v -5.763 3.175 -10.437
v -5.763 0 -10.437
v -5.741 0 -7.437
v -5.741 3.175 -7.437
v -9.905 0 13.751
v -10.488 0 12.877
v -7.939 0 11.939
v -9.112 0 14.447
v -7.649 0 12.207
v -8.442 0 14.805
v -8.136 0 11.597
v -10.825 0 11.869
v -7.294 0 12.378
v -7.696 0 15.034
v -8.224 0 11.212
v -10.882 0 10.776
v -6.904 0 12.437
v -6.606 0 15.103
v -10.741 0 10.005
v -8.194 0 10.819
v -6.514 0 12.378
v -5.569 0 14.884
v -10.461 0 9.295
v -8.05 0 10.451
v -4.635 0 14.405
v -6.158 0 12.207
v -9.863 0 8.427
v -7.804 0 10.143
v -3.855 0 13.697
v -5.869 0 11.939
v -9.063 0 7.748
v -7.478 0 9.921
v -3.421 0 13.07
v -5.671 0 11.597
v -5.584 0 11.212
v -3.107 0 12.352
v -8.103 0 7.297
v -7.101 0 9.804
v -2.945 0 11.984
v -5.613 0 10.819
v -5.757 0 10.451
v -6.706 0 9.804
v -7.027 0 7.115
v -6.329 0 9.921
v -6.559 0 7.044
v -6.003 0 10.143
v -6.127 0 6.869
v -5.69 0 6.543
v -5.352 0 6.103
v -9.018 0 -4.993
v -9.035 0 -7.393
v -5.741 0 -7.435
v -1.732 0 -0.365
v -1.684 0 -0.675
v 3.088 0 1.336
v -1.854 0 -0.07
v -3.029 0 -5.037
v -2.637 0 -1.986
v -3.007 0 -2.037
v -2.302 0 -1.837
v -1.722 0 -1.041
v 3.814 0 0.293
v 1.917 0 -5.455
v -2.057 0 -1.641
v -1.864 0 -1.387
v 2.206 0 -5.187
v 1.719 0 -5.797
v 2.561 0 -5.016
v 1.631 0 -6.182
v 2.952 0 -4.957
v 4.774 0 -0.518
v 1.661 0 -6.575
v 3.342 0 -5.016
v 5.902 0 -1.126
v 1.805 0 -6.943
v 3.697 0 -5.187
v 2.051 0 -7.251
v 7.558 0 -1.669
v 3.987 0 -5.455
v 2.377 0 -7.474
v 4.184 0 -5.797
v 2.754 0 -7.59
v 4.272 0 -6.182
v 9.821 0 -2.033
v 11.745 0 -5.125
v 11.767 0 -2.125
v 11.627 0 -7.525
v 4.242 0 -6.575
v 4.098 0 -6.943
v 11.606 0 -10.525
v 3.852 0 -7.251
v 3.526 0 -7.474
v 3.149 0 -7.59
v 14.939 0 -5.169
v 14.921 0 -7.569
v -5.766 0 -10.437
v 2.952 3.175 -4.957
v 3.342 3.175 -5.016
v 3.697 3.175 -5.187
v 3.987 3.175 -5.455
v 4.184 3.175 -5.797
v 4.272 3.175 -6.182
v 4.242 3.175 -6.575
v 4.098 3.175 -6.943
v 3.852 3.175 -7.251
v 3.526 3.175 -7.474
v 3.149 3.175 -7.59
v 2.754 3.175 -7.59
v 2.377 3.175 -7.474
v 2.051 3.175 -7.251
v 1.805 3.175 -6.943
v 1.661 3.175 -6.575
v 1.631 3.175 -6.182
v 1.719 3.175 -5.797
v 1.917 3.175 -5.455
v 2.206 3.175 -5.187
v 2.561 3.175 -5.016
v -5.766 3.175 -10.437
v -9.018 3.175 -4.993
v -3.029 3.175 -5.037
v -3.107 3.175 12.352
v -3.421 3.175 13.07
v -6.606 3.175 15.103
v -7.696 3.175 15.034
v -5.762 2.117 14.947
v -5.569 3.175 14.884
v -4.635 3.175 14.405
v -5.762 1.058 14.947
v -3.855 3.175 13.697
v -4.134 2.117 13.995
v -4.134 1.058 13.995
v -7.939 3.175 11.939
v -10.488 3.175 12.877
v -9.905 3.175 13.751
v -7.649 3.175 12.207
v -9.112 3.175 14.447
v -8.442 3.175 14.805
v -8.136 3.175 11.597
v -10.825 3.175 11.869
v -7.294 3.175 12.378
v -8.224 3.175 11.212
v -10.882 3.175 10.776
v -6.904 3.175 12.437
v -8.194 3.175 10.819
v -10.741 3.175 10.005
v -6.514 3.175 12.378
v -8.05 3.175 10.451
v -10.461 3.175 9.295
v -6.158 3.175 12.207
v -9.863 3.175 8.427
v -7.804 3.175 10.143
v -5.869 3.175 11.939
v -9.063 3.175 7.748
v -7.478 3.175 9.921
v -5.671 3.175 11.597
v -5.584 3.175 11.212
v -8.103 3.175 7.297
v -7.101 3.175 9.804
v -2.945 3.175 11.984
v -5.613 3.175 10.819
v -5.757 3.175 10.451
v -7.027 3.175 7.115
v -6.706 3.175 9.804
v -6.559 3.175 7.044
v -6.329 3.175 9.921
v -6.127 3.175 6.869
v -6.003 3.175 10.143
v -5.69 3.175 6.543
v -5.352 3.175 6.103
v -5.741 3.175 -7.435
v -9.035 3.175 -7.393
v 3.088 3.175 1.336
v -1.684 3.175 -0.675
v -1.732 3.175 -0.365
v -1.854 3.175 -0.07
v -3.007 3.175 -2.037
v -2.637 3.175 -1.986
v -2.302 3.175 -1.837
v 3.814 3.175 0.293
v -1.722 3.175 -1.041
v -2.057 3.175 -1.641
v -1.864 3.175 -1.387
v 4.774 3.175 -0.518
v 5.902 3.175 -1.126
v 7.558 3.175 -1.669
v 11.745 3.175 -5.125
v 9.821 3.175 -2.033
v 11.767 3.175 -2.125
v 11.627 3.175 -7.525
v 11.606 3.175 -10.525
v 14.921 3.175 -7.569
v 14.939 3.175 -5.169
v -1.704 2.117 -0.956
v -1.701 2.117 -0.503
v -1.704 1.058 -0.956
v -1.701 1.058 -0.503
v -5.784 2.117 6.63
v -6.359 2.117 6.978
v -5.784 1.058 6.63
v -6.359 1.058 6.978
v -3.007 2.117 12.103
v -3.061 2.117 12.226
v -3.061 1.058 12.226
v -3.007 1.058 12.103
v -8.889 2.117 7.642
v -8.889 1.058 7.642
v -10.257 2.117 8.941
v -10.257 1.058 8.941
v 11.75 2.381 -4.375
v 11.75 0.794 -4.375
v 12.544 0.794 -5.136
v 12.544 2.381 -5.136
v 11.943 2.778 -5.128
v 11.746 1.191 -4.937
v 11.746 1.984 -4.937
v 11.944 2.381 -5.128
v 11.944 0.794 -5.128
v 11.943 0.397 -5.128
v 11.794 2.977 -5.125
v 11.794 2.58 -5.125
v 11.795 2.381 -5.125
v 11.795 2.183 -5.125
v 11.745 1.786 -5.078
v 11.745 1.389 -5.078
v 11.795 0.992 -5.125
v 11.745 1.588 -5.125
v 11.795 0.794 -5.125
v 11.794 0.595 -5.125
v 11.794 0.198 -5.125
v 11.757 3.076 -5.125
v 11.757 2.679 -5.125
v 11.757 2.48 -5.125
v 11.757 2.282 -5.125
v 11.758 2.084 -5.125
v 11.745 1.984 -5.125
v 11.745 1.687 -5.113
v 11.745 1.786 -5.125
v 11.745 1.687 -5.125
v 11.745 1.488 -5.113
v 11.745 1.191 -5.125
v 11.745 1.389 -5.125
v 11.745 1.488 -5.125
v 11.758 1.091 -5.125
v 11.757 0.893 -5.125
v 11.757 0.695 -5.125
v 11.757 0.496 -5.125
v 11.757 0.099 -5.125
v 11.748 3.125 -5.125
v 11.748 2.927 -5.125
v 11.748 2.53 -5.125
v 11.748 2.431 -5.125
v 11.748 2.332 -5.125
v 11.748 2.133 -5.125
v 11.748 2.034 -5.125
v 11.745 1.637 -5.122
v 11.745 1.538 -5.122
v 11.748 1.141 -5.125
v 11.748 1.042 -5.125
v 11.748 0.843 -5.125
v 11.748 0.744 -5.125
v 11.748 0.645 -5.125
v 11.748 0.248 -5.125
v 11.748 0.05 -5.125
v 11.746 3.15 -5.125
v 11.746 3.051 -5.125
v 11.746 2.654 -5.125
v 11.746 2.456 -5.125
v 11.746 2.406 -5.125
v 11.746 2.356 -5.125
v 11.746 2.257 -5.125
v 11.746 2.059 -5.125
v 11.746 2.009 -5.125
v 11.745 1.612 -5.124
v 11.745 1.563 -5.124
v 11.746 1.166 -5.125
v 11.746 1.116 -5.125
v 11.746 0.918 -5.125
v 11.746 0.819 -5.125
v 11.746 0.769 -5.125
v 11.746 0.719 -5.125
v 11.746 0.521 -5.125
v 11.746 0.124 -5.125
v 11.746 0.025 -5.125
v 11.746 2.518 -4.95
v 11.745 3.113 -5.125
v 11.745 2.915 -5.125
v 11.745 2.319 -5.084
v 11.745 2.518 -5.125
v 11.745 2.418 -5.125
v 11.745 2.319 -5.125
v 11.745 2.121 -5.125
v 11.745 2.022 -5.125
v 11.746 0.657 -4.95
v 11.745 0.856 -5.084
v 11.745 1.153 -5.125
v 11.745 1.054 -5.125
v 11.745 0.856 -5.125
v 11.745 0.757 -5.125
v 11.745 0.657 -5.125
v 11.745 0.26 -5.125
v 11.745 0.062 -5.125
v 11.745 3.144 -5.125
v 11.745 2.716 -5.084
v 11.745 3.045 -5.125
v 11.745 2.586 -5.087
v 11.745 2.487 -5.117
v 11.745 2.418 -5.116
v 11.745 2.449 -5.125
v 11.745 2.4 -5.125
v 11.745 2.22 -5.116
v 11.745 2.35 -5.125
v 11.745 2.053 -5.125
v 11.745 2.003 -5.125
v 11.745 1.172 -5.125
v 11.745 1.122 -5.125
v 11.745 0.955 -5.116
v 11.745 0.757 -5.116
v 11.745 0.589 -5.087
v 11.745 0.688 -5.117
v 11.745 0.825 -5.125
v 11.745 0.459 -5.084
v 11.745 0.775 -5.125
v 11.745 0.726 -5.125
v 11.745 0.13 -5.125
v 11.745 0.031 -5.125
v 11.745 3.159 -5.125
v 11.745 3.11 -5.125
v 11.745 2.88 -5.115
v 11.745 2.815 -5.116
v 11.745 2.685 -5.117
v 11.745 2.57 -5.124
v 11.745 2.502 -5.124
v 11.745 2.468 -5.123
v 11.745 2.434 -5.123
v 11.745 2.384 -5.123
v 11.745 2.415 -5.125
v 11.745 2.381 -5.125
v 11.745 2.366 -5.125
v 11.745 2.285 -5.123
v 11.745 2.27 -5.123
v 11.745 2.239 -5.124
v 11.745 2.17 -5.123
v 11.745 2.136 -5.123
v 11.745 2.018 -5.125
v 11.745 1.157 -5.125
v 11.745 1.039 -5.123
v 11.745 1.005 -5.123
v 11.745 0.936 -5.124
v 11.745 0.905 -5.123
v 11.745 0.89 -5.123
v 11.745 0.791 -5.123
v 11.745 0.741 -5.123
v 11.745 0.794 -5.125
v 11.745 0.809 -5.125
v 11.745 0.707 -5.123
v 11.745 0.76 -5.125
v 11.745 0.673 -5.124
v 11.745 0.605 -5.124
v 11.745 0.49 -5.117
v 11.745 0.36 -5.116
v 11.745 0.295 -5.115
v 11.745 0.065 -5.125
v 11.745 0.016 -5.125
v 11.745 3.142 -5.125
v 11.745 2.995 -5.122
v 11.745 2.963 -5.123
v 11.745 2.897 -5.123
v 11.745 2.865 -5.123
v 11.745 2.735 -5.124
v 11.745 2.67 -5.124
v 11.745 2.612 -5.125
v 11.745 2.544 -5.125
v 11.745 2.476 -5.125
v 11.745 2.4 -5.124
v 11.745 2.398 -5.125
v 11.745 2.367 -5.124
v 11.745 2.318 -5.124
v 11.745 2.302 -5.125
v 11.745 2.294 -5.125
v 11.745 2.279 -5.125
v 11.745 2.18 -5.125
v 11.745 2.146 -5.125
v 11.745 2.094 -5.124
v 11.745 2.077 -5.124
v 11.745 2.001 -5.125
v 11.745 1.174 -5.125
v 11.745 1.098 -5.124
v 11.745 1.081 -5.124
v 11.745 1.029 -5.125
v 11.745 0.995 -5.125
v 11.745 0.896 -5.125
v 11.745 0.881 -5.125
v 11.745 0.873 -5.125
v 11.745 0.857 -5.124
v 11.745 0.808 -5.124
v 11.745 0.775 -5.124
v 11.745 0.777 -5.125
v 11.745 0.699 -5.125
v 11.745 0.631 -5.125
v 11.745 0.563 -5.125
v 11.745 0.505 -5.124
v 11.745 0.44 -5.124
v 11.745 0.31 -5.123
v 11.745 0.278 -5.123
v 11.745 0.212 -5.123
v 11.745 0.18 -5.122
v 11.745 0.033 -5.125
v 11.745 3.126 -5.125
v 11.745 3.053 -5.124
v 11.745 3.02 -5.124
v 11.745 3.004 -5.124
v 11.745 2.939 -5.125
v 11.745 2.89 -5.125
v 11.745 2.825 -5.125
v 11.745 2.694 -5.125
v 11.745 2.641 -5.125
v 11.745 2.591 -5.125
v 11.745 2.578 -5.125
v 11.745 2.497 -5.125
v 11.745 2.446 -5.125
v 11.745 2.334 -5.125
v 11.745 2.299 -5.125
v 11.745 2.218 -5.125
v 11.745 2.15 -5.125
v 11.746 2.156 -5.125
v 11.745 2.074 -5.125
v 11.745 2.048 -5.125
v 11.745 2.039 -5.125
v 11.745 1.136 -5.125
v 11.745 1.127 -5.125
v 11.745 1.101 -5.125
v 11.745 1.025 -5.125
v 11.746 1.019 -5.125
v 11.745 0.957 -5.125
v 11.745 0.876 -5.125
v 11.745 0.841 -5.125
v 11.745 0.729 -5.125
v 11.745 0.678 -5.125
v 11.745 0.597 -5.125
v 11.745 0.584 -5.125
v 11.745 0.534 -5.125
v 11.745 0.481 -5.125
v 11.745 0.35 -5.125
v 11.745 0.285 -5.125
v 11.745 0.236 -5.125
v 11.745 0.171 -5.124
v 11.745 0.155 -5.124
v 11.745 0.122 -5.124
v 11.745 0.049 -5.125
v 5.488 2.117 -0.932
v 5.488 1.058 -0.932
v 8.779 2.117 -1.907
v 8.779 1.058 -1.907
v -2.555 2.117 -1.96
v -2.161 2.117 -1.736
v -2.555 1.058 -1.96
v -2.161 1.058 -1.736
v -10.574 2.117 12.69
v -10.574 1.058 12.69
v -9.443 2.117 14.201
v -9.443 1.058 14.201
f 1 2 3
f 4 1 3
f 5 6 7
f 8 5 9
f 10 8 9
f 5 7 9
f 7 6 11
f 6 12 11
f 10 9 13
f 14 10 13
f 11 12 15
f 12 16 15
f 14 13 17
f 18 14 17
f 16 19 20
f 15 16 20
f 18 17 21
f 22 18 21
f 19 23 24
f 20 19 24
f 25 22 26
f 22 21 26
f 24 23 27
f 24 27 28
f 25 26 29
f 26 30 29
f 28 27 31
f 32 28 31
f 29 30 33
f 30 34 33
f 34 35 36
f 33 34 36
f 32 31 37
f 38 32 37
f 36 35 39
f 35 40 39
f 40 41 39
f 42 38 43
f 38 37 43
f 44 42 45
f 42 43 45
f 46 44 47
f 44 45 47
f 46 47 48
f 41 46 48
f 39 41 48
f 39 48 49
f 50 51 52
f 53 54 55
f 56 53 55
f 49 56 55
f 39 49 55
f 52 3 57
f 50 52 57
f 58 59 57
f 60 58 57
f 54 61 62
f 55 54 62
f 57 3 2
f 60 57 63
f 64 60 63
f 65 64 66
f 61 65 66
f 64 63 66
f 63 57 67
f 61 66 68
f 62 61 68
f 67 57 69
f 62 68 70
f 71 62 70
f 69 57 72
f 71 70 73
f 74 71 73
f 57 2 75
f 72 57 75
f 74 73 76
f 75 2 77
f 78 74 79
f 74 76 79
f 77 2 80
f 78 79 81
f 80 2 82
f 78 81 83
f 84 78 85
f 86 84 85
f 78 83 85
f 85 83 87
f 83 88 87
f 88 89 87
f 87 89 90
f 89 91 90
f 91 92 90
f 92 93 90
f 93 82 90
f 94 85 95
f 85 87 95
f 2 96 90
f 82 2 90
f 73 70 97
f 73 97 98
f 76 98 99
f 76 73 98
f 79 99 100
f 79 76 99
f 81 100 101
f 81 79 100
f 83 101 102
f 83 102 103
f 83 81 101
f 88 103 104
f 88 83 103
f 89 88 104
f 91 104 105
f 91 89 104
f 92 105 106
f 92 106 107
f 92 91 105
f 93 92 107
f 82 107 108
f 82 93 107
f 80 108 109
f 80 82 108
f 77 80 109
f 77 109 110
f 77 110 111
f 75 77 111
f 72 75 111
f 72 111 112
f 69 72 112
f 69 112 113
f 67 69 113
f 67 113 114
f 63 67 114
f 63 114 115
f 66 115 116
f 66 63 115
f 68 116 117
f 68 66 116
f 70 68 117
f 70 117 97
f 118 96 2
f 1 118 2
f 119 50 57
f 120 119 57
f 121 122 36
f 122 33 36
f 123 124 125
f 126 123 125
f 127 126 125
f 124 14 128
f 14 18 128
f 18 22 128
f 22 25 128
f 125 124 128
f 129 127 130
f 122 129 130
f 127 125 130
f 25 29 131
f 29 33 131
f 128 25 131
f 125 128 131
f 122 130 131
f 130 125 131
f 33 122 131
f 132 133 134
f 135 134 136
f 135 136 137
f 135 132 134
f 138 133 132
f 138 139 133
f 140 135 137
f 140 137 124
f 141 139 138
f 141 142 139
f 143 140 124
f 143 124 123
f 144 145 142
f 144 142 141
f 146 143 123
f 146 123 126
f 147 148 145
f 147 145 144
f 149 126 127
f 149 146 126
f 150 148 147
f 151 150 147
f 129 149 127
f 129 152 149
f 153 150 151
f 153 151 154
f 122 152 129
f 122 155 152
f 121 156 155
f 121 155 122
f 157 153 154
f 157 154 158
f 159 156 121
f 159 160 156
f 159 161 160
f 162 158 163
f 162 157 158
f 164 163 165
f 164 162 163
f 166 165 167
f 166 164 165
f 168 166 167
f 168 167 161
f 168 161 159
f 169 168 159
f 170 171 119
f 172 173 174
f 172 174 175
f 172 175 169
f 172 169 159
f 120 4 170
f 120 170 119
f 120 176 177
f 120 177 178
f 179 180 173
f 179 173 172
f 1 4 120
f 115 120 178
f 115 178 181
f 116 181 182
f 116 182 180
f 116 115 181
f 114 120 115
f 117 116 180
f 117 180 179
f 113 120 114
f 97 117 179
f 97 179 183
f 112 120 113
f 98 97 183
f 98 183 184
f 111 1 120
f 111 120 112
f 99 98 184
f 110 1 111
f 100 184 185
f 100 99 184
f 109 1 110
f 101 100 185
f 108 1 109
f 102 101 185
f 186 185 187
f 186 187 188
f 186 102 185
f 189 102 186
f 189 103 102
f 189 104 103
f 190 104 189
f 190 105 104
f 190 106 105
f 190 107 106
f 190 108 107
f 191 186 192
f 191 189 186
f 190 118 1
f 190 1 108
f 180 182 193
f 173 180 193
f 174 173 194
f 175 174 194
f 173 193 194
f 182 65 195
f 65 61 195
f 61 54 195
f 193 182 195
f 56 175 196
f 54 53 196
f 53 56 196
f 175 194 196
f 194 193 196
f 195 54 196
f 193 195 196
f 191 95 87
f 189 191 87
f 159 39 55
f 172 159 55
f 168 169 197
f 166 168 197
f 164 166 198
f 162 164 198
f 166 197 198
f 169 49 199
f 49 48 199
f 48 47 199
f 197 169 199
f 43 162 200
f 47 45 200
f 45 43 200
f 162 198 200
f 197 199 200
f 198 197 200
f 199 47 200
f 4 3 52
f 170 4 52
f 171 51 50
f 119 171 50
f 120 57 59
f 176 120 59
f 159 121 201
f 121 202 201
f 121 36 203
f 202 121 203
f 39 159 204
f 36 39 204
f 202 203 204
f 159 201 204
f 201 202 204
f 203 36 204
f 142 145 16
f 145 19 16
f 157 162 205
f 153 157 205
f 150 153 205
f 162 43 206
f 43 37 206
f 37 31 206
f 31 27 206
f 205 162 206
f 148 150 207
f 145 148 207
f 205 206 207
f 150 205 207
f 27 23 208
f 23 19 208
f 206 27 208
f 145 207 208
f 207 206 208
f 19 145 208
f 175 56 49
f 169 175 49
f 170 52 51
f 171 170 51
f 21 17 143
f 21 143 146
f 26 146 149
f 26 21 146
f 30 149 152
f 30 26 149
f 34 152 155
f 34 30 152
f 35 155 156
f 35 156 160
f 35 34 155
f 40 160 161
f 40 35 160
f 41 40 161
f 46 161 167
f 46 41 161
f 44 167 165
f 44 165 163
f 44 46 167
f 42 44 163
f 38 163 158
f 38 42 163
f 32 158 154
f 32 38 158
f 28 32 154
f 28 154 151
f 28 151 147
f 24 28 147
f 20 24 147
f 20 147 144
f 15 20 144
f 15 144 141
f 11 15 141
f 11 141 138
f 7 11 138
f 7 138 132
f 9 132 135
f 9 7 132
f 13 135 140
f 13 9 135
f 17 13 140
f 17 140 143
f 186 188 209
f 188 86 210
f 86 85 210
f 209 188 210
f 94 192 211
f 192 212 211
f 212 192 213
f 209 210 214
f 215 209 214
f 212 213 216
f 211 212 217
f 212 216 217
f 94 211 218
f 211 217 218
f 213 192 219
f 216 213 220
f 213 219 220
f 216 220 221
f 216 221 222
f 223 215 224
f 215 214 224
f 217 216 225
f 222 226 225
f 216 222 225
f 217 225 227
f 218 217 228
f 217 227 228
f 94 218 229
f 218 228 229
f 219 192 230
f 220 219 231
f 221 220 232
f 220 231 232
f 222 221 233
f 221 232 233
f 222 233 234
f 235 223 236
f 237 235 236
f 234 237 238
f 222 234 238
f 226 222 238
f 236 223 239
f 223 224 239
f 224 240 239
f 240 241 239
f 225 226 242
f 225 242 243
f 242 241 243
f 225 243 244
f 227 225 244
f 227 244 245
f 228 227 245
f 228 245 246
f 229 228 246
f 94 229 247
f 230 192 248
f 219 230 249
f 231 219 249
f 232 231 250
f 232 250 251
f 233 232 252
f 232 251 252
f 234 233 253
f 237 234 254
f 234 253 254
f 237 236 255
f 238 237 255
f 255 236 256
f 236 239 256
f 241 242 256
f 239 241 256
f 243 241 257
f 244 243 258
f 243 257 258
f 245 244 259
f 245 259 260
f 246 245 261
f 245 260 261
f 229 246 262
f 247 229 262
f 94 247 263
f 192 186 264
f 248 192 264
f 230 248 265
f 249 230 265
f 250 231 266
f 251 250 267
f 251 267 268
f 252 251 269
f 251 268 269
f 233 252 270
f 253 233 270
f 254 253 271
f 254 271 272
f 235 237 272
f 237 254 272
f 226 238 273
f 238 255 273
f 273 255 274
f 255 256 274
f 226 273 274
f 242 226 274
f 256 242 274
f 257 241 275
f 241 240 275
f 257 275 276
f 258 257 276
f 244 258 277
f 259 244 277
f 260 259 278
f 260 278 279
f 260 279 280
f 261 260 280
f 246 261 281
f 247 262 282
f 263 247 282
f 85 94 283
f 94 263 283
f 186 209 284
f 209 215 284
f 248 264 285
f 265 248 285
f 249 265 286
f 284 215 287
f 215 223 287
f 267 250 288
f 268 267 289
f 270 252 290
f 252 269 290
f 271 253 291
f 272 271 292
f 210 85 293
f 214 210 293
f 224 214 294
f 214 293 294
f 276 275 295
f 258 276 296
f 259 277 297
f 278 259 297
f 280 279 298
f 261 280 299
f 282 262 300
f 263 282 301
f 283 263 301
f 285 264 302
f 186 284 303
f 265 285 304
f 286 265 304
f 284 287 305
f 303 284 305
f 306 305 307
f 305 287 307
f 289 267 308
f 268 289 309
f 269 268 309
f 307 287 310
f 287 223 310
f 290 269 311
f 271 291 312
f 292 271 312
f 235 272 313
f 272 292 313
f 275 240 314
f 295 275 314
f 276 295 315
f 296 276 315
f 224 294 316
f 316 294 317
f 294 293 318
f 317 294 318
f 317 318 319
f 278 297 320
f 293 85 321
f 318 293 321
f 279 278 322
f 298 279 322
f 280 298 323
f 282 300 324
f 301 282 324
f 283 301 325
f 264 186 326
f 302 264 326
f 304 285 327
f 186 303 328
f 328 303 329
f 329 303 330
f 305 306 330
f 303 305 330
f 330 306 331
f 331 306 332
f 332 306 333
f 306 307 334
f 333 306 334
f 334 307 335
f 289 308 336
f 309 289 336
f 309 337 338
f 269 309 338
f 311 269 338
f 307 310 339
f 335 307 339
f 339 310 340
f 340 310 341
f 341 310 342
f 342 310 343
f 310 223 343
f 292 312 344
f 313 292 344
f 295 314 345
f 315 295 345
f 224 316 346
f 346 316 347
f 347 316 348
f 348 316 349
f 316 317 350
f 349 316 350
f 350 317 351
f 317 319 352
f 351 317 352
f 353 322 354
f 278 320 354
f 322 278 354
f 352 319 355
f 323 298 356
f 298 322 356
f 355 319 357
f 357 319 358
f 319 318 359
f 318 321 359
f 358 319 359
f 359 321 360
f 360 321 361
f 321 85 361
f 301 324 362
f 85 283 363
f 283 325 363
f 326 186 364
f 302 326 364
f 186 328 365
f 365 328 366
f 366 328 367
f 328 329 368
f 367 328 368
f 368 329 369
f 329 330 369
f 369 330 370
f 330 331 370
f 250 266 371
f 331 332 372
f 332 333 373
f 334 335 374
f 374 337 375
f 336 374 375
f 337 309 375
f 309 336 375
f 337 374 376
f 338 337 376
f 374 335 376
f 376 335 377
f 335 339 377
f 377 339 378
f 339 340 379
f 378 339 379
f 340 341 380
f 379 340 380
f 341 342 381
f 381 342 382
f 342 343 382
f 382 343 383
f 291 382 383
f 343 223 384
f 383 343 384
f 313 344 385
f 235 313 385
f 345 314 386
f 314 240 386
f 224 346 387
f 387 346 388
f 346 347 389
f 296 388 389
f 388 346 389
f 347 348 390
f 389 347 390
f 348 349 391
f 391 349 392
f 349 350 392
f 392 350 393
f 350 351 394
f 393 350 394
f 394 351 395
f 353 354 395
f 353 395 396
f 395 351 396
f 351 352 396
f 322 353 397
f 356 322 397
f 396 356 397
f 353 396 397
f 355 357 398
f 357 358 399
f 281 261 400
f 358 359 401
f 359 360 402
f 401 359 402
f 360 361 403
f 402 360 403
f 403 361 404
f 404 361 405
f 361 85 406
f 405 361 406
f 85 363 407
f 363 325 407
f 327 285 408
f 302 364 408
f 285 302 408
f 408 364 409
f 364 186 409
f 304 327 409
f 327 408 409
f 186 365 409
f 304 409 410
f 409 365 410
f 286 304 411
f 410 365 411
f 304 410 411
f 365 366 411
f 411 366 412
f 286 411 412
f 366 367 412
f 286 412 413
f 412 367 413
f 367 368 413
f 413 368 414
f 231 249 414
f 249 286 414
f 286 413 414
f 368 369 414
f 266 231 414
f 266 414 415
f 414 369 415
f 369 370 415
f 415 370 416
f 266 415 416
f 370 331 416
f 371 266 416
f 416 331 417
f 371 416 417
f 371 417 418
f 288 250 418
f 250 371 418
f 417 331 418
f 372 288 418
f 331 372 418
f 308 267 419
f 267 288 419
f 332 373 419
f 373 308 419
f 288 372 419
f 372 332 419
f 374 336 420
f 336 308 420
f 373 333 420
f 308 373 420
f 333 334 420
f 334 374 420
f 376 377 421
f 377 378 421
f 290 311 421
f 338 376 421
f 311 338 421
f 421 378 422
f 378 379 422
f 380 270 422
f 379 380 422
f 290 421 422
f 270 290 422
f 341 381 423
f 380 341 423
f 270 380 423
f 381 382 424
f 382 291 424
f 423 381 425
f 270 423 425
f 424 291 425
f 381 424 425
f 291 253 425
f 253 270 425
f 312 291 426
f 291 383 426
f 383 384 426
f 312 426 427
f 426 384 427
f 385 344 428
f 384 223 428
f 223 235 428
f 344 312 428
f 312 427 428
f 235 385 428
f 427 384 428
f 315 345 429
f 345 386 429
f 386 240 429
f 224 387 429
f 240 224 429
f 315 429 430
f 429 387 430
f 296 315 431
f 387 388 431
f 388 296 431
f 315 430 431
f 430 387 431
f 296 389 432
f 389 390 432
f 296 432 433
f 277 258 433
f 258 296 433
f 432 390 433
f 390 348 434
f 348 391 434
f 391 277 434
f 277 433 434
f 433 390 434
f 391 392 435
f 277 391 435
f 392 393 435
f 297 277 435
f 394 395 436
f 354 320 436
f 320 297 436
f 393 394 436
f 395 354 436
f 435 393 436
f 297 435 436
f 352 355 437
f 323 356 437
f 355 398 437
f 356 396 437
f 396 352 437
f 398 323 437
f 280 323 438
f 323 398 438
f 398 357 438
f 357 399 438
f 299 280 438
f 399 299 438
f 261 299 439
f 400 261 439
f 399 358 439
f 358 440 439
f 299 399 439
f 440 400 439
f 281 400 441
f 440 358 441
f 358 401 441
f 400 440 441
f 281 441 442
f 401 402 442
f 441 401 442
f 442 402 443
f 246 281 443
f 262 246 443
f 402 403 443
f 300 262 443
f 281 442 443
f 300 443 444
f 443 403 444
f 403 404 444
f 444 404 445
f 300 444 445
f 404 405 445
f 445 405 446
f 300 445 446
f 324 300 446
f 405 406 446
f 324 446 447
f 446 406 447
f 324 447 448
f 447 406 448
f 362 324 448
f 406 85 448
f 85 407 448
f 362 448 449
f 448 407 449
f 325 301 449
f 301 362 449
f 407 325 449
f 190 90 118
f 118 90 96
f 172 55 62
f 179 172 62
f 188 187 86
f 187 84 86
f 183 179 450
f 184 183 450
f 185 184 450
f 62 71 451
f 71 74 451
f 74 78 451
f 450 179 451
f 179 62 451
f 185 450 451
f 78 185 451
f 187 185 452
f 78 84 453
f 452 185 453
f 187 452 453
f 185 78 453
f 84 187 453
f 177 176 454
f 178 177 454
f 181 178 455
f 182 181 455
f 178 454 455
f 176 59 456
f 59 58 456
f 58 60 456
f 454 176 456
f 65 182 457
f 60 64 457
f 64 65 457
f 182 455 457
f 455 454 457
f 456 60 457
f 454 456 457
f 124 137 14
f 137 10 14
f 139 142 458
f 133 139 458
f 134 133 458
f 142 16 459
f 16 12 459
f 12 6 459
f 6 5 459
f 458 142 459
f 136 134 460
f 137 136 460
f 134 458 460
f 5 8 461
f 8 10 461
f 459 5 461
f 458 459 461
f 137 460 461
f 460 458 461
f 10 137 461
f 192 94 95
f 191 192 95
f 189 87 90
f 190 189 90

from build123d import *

# Parameters (mm, degrees)
SKETCH1_R           = 1.32389541
SKETCH1_R_2         = 1.323699758
BOSS_EXTRUDE1_DEPTH = 3.175


with BuildPart() as part:
    # Sketch1 → Boss-Extrude1 (new body)
    with BuildSketch(Plane(origin=(0, 0, 0), x_dir=(1, 0, 0), z_dir=(0, 1, 0))):
        with BuildLine():
            Line((-5.766463736, 10.436835071), (-5.763397789, 10.436835071))
            Line((-5.763397789, 10.436835071), (-5.741482849, 7.436754545))
            Line((-5.741482849, 7.436754545), (-5.741482849, 7.43457666))
            Line((-5.741482849, 7.43457666), (-9.035328609, 7.392845258))
            Line((-9.035328609, 7.392845258), (-9.017756687, 4.992874594))
            Line((-9.017756687, 4.992874594), (-3.028577982, 5.036774114))
            Line((-3.028577982, 5.036774114), (-3.006858015, 2.03663499))
            add(Edge.make_bspline(
                [(-3.006858015, 2.03663499), (-2.537212459, 2.04027782), (-2.101492166, 1.792457947), (-1.86369849, 1.386795127)],
                knots=[7, 7, 7, 7, 8, 8, 8, 8], degree=3))
            add(Edge.make_bspline(
                [(-1.86369849, 1.386795127), (-1.625904815, 0.981269034), (-1.622327064, 0.479281193), (-1.854110704, 0.070102504)],
                knots=[8, 8, 8, 8, 9, 9, 9, 9], degree=3))
            Line((-1.854110704, 0.070102504), (-5.351888242, -6.103195522))
            add(Edge.make_bspline(
                [(-5.351888242, -6.103195522), (-5.695800728, -6.710083196), (-6.330407878, -7.093469085), (-7.026733662, -7.115042842)],
                knots=[10, 10, 10, 10, 11, 11, 11, 11], degree=3))
            add(Edge.make_bspline(
                [(-7.026733662, -7.115042842), (-9.053280728, -7.177635062), (-10.711446226, -8.751884558), (-10.882412982, -10.775901488)],
                knots=[11, 11, 11, 11, 12, 12, 12, 12], degree=3))
            add(Edge.make_bspline(
                [(-10.882412982, -10.775901488), (-11.053189639, -12.799977016), (-9.682969691, -14.630953252), (-7.695582907, -15.033920574)],
                knots=[12, 12, 12, 12, 13, 13, 13, 13], degree=3))
            add(Edge.make_bspline(
                [(-7.695582907, -15.033920574), (-5.708322855, -15.436702335), (-3.735061849, -14.283722207), (-3.107161762, -12.352201909)],
                knots=[13, 13, 13, 13, 14, 14, 14, 14], degree=3))
            add(Edge.make_bspline(
                [(-3.107161762, -12.352201909), (-3.065505827, -12.224448933), (-3.011327766, -12.101305651), (-2.945076016, -11.984237008)],
                knots=[14, 14, 14, 14, 15, 15, 15, 15], degree=3))
            Line((-2.945076016, -11.984237008), (3.088122669, -1.336147093))
            add(Edge.make_bspline(
                [(3.088122669, -1.336147093), (4.643620376, 1.757768048), (9.32927932, 2.106844923), (11.766760764, 2.124639123)],
                knots=[16, 16, 16, 16, 17, 17, 17, 17], degree=3))
            add(Edge.make_bspline(
                [(11.766760764, 2.124639123), (11.744850698, 5.124788013), (11.745167529, 5.124788013)],
                knots=[17, 17, 17, 18, 18, 18], degree=2))
            add(Edge.make_bspline(
                [(11.745167529, 5.124788013), (11.7455526, 5.124788013), (14.938899641, 5.168687533)],
                knots=[18, 18, 18, 19, 19, 19], degree=2))
            Line((14.938899641, 5.168687533), (14.92132772, 7.5685996))
            Line((14.92132772, 7.5685996), (11.627486834, 7.524690313))
            Line((11.627486834, 7.524690313), (11.605571894, 10.524643877))
            Line((11.605571894, 10.524643877), (-5.766463736, 10.436835071))
        make_face()
        with Locations(Location((2.951690467, 6.280829877, 0), (0, 0, 270))):
            Circle(SKETCH1_R, mode=Mode.SUBTRACT)
        with Locations(Location((-6.903683904, -11.113205089, 0), (0, 0, 270))):
            Circle(SKETCH1_R_2, mode=Mode.SUBTRACT)
    extrude(amount=BOSS_EXTRUDE1_DEPTH)


solid = part.part
